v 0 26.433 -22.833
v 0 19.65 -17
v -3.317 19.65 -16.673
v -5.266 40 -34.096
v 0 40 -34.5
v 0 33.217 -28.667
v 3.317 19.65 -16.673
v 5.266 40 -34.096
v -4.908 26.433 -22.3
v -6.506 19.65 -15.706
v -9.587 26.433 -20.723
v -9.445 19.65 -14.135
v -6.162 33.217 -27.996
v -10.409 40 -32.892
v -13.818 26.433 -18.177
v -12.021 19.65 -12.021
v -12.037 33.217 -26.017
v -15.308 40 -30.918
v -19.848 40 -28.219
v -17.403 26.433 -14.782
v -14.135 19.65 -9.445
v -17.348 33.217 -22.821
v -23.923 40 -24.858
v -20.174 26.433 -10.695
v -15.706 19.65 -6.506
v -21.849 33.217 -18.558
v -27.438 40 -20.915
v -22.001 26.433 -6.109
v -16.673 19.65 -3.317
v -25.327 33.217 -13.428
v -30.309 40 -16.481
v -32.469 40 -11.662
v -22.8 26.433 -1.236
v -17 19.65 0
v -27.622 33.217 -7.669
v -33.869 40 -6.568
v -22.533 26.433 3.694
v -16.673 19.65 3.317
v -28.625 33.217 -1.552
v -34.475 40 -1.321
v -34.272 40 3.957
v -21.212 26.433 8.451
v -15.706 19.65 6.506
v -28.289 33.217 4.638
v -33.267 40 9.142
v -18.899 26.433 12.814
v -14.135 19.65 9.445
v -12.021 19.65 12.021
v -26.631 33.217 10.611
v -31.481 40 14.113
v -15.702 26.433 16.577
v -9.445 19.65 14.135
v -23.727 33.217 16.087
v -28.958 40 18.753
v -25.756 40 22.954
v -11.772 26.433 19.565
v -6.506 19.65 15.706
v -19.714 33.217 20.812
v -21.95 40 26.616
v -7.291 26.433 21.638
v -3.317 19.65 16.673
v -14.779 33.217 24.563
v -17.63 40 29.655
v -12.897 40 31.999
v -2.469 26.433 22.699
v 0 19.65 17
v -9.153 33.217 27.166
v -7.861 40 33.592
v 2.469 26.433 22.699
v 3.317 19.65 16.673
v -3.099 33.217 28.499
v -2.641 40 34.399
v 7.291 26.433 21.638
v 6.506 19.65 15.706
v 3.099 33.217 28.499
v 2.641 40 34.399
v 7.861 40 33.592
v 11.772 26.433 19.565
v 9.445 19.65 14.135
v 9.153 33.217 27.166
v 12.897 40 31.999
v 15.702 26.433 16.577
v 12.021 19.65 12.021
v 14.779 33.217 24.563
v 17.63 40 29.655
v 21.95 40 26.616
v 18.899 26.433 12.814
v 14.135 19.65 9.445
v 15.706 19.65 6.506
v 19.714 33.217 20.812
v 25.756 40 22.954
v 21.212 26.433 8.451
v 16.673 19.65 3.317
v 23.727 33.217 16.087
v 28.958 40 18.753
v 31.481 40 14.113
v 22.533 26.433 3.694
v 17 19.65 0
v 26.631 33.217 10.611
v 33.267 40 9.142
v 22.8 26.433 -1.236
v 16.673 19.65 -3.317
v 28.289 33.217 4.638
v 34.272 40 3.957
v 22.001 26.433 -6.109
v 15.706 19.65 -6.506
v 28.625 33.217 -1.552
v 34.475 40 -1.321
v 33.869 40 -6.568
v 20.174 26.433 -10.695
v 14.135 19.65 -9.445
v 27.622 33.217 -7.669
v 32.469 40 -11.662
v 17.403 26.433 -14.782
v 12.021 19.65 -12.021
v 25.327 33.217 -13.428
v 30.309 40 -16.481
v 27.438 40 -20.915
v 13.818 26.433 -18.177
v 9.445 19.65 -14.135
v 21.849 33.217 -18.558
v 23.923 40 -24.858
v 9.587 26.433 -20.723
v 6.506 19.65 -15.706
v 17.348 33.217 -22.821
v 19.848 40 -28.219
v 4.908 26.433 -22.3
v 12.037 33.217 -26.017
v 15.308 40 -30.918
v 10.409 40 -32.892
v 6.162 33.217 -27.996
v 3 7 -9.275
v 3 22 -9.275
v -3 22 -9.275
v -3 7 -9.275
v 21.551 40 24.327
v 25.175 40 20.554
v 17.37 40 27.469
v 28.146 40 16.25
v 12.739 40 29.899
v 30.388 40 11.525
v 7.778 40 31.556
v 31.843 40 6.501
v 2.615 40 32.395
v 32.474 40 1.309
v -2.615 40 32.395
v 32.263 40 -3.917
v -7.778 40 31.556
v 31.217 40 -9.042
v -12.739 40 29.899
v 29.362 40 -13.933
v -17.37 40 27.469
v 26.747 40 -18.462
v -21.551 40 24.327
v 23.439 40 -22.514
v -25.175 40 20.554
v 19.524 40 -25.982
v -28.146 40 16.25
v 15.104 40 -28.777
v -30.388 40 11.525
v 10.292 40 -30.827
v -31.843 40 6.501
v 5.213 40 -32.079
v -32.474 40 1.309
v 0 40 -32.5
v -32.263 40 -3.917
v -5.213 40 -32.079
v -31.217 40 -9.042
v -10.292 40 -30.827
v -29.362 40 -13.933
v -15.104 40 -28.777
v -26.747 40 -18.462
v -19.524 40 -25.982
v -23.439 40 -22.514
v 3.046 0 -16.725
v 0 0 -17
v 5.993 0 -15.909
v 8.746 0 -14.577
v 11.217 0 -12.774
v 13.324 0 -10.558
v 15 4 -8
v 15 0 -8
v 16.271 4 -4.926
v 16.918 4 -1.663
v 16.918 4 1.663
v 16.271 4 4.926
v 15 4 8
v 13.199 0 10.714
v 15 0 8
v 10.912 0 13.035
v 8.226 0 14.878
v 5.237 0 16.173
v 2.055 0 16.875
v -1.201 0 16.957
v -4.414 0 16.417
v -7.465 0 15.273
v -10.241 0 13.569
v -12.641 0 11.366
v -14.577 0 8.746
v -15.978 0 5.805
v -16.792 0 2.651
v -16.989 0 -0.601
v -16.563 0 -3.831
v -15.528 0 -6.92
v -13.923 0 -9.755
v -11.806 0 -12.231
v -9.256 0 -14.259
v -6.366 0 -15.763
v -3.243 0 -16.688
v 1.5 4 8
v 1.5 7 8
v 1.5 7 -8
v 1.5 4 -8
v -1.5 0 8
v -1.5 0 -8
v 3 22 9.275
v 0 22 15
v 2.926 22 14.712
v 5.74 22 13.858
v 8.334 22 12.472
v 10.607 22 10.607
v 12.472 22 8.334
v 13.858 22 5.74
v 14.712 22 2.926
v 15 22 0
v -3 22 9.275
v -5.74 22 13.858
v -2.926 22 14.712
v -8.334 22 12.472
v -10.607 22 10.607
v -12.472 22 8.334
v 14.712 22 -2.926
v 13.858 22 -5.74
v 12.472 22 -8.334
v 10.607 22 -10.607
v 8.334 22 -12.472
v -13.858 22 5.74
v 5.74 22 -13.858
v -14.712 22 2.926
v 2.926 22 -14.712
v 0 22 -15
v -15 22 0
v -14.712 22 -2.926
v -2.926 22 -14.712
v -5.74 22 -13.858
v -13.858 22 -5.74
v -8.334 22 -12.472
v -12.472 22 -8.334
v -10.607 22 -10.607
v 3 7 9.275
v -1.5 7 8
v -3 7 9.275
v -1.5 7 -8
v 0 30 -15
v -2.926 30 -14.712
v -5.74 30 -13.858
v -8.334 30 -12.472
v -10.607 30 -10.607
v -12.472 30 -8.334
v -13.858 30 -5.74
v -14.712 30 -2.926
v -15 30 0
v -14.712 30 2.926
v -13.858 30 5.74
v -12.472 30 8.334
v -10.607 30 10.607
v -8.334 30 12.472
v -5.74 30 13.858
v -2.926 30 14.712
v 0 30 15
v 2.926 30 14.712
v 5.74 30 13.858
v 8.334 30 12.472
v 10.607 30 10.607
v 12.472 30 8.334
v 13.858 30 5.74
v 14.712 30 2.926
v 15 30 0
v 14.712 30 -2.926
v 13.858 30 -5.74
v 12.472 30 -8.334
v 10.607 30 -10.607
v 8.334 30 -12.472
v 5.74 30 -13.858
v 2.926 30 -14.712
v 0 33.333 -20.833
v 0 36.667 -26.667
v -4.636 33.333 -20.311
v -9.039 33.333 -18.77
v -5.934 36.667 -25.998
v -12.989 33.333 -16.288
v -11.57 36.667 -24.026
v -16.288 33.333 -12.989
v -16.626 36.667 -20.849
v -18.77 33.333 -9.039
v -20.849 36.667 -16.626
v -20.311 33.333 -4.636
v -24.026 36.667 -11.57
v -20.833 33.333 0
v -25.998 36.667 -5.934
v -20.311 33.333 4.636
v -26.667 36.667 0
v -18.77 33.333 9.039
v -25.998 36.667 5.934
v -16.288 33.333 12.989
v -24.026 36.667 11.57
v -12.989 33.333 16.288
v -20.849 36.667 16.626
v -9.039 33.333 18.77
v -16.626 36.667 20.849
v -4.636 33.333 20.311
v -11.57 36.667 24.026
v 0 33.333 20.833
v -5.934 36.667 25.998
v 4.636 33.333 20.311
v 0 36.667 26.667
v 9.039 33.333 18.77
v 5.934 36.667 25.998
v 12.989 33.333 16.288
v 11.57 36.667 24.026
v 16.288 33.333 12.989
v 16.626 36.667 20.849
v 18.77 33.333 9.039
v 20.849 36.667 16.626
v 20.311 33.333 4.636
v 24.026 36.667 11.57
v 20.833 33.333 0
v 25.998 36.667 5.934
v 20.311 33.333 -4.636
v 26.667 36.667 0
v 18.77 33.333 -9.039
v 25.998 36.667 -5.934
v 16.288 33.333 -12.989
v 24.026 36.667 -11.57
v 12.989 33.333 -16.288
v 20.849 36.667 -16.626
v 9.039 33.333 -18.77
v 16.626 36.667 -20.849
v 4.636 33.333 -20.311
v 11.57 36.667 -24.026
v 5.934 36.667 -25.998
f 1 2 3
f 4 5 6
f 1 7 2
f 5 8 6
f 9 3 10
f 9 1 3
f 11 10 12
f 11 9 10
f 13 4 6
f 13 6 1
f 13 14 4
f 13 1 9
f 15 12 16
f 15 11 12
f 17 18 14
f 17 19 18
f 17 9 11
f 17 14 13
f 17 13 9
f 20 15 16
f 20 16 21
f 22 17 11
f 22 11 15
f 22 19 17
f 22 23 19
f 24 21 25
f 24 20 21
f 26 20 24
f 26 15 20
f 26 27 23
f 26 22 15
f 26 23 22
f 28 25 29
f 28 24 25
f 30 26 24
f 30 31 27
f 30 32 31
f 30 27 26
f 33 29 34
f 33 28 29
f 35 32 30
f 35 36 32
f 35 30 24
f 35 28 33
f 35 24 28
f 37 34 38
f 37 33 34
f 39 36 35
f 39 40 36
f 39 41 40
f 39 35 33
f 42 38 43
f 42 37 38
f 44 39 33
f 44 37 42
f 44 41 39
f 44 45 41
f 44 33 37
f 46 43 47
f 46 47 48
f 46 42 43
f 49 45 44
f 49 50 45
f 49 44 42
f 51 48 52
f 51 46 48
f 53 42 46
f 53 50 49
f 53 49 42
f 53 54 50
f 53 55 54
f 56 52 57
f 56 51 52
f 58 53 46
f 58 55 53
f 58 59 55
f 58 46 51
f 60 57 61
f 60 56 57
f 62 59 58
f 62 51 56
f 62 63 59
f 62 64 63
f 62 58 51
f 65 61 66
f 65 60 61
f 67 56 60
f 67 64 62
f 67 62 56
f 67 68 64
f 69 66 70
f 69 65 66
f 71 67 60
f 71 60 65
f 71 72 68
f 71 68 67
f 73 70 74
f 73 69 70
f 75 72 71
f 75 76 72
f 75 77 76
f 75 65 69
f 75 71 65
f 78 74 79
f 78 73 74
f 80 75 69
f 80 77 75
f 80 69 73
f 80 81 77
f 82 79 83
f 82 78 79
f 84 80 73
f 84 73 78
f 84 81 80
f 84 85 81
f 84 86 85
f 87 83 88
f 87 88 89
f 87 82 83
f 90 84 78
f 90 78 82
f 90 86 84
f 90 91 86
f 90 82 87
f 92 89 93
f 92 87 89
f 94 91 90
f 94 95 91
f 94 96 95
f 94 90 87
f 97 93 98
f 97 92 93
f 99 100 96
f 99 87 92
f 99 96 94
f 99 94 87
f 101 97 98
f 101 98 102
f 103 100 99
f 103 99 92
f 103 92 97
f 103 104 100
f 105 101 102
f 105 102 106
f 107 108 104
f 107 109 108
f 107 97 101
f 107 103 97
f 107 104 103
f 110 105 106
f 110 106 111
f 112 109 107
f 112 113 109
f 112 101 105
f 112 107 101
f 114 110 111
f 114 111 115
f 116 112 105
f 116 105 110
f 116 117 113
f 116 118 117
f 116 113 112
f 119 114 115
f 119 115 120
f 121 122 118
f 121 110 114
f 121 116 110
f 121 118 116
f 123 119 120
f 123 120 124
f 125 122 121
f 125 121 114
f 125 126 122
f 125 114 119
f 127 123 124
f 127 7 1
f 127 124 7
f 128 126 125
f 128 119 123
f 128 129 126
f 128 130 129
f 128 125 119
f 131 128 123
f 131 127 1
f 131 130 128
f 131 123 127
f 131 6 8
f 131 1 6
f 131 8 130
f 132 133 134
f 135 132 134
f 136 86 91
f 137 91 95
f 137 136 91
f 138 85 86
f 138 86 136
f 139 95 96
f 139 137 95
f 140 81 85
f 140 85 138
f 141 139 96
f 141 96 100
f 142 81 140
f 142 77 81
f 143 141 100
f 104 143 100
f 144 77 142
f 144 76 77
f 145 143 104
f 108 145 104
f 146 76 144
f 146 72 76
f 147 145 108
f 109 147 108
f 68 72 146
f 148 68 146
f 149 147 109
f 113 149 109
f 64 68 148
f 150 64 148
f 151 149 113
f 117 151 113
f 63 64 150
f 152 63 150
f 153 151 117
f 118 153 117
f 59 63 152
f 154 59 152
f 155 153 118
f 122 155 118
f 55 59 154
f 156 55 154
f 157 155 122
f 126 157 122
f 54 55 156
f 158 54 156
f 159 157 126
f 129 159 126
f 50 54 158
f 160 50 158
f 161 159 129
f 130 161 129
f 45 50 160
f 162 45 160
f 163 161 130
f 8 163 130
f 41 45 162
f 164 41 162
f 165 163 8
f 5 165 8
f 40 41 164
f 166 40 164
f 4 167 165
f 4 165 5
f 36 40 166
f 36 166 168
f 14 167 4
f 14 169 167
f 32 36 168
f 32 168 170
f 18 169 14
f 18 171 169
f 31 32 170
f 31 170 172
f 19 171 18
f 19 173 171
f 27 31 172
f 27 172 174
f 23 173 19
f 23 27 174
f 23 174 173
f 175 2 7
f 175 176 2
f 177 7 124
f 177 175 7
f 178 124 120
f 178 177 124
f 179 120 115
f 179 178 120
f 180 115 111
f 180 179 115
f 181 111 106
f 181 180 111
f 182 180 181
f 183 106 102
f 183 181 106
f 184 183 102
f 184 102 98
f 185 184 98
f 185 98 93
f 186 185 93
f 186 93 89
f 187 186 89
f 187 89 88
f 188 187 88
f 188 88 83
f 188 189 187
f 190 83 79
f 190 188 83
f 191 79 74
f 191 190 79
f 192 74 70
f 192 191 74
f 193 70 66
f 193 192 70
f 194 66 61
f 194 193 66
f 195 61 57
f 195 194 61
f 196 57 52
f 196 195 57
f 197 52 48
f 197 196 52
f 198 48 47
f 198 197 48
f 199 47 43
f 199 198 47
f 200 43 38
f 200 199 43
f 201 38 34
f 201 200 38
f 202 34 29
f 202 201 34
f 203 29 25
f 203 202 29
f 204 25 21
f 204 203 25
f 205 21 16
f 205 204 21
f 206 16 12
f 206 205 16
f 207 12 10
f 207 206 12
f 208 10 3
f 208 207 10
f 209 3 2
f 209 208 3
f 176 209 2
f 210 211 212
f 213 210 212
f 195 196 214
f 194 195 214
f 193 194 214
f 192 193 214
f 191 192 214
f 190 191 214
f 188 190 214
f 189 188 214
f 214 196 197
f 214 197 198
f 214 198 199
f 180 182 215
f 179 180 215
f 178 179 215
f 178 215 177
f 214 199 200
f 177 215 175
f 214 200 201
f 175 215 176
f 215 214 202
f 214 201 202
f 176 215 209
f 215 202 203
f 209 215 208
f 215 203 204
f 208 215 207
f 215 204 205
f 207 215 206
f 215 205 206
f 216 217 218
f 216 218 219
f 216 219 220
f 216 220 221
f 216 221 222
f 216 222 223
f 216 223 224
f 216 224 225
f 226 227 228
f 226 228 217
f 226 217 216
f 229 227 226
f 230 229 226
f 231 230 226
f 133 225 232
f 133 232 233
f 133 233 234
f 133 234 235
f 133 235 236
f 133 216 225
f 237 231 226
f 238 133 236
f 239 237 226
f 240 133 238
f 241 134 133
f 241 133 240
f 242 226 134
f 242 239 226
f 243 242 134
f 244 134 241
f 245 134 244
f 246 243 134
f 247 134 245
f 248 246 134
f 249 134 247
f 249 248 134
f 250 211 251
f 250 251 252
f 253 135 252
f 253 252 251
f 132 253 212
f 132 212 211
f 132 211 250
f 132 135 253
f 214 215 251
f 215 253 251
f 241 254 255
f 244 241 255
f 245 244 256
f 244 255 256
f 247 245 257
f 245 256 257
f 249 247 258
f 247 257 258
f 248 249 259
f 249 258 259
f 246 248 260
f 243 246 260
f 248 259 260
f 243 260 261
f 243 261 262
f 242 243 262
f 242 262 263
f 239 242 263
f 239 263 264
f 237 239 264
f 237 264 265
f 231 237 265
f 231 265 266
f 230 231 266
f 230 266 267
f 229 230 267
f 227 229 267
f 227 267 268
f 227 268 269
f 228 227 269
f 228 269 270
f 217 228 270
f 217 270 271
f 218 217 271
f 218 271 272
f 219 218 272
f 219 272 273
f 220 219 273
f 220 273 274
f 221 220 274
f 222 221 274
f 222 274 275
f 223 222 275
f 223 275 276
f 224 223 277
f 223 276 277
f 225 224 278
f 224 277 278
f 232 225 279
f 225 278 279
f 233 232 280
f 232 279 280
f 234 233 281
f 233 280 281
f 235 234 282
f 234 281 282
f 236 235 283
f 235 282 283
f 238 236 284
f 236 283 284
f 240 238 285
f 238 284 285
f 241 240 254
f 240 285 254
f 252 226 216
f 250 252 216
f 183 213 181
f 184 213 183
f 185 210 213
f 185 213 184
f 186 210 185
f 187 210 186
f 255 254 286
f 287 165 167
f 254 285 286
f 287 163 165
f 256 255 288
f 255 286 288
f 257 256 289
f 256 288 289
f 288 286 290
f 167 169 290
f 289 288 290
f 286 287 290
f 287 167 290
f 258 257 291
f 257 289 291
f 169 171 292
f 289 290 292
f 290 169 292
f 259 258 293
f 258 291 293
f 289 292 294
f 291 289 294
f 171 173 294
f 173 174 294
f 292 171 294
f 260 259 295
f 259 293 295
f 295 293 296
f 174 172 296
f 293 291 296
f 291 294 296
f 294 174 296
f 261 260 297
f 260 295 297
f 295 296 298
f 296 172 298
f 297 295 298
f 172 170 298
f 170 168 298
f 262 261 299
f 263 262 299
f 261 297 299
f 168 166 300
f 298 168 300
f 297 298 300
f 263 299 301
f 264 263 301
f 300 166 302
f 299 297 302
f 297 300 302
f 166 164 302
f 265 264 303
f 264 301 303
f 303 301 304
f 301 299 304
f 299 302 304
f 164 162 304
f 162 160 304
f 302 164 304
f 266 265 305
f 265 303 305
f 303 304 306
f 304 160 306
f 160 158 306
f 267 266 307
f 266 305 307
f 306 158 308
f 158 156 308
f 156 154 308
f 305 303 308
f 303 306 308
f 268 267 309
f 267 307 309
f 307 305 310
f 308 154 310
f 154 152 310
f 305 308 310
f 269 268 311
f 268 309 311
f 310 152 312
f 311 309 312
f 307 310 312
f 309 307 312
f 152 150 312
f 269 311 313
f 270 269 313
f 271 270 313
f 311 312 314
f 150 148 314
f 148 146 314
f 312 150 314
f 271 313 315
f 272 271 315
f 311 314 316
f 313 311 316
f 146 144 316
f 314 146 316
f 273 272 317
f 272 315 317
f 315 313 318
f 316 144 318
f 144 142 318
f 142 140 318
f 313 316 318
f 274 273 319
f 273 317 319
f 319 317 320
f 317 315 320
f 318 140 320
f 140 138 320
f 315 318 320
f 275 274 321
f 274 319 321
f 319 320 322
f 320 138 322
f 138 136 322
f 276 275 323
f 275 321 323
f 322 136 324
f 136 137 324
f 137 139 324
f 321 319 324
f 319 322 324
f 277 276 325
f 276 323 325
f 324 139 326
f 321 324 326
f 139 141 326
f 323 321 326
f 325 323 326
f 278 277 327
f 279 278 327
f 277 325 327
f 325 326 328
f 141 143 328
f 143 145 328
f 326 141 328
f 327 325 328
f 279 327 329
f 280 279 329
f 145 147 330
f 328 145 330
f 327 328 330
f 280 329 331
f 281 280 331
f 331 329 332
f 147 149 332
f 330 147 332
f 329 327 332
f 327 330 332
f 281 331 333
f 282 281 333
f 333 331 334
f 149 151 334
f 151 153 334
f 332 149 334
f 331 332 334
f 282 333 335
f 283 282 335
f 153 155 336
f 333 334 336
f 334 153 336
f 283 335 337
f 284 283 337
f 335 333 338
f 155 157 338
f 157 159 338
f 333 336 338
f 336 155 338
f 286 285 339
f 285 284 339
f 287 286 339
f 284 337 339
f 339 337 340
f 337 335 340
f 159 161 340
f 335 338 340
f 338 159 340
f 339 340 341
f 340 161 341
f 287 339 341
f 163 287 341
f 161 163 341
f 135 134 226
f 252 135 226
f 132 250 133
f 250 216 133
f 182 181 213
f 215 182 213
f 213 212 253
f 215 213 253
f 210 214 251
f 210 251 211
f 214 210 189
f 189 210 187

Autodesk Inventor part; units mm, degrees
ref_plane "YZ Plane" through (0, 0, 0) normal (1, 0, 0) x (0, 1, 0)
ref_plane "XZ Plane" through (0, 0, 0) normal (0, 1, 0) x (-1, 0, 0)
ref_plane "XY Plane" through (0, 0, 0) normal (0, 0, 1) x (1, 0, 0)
sketch "Sketch2" plane through (0, 0, 0) normal (1, 0, 0) x (0, 1, 0)
  line L0 (0, 0) -> (0, -17)
  line L1 (0, 0) -> (22, 0)
  line L2 (22, 0) -> (22, -15)
  line L3 (22, 0) -> (30, 0) construction
  line L4 (30, 0) -> (30, -17) construction
  line L5 (22, -17) -> (22, -15) construction
  line L6 (30, 0) -> (40, 0)
  line L7 (40, 0) -> (40, -34.5) construction
  line L8 (40, -34.5) -> (40, -32.5)
  line L9 (40, -32.5) -> (30, -15)
  line L10 (22, -15) -> (30, -15)
  line L11 (22, -15) -> (22, 0) construction
  line L12 (40, -34.5) -> (19.6496, -17)
  line L13 (19.6496, -17) -> (0, -17)
  dimension "d0" = 17
  dimension "d1" = 22
  dimension "d3" = 8
  dimension "d4" = 10
  dimension "d5" = 34.5
  dimension "d6" = 2
revolve "Revolution1" add sketch "Sketch2" angle 360 about axis through (0, 22, 0) along (0, 1, 0)
sketch "Sketch3" plane through (0, 22, 0) normal (0, 1, 0) x (1, 0, 0)
  line L0 (-3, -9.275) -> (3, -9.275)
  line L1 (3, -9.275) -> (3, 9.275)
  line L2 (3, 9.275) -> (-3, 9.275)
  line L3 (-3, 9.275) -> (-3, -9.275)
  line L4 (-3, -9.275) -> (3, 9.275) construction
  line L5 (3, -9.275) -> (-3, 9.275) construction
  point P0 (0, 0)
  dimension "d8" = 6
  dimension "d9" = 18.55
extrude "Extrusion1" cut sketch "Sketch3" against normal blind 15
sketch "Sketch4" plane through (0, 7, 0) normal (0, 1, 0) x (1, 0, 0)
  line L0 (-1.5, -8) -> (1.5, -8)
  line L1 (1.5, -8) -> (1.5, 8)
  line L2 (1.5, 8) -> (-1.5, 8)
  line L3 (-1.5, 8) -> (-1.5, -8)
  line L4 (-1.5, -8) -> (1.5, 8) construction
  line L5 (1.5, -8) -> (-1.5, 8) construction
  point P0 (0, 0)
  dimension "d12" = 3
  dimension "d13" = 16
extrude "Extrusion2" cut sketch "Sketch4" against normal blind 7
sketch "Sketch5" plane through (0, 0, 0) normal (0, -1, 0) x (1, 0, 0)
  line L0 (1.5, -8) -> (1.5, 8) projected
  line L1 (1.5, -8) -> (17.518, -8)
  line L2 (17.518, -8) -> (17.518, 8)
  line L3 (17.518, 8) -> (1.5, 8)
  line L4 (1.5, 8) -> (1.5, -8)
  point P0 (0, 0)
extrude "Extrusion3" cut sketch "Sketch5" against normal blind 4
properties part number "fitted nu funnel easy angle"
